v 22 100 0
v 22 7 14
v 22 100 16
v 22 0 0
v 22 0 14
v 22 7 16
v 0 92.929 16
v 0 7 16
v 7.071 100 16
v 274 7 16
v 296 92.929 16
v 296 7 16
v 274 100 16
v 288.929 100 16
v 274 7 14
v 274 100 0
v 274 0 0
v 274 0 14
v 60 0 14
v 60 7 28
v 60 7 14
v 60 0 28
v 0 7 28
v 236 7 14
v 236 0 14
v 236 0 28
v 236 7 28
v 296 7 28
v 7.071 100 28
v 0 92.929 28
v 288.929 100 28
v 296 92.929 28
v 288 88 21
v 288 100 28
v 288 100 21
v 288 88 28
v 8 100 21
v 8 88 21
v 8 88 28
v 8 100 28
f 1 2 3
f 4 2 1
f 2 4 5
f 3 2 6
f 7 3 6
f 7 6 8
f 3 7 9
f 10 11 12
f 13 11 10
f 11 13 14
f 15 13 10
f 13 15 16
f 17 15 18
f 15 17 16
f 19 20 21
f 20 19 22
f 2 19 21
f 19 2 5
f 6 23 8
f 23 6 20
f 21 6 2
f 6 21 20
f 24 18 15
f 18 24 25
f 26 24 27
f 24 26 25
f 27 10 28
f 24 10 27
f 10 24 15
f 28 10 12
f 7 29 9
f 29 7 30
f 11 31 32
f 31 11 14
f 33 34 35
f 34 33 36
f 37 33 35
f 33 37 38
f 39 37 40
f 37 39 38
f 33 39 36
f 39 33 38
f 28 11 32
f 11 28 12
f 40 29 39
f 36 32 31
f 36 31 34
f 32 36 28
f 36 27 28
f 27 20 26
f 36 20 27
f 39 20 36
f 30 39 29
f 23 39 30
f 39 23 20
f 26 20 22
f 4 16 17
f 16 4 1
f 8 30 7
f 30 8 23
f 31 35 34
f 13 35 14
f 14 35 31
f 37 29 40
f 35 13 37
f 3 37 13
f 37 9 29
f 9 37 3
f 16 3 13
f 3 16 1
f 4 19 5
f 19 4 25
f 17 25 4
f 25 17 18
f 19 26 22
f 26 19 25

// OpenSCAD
include <../src/wardrobe.scad>;
plank_yx_side_bottom();
//github_openscad -o wardrobe_1/plank_yx_side_bottom.stl -D wardrobe_n=1 -D cutting_edge=0 -D break_view_length=0 wardrobe_1/plank_yx_side_bottom_stl.scad
